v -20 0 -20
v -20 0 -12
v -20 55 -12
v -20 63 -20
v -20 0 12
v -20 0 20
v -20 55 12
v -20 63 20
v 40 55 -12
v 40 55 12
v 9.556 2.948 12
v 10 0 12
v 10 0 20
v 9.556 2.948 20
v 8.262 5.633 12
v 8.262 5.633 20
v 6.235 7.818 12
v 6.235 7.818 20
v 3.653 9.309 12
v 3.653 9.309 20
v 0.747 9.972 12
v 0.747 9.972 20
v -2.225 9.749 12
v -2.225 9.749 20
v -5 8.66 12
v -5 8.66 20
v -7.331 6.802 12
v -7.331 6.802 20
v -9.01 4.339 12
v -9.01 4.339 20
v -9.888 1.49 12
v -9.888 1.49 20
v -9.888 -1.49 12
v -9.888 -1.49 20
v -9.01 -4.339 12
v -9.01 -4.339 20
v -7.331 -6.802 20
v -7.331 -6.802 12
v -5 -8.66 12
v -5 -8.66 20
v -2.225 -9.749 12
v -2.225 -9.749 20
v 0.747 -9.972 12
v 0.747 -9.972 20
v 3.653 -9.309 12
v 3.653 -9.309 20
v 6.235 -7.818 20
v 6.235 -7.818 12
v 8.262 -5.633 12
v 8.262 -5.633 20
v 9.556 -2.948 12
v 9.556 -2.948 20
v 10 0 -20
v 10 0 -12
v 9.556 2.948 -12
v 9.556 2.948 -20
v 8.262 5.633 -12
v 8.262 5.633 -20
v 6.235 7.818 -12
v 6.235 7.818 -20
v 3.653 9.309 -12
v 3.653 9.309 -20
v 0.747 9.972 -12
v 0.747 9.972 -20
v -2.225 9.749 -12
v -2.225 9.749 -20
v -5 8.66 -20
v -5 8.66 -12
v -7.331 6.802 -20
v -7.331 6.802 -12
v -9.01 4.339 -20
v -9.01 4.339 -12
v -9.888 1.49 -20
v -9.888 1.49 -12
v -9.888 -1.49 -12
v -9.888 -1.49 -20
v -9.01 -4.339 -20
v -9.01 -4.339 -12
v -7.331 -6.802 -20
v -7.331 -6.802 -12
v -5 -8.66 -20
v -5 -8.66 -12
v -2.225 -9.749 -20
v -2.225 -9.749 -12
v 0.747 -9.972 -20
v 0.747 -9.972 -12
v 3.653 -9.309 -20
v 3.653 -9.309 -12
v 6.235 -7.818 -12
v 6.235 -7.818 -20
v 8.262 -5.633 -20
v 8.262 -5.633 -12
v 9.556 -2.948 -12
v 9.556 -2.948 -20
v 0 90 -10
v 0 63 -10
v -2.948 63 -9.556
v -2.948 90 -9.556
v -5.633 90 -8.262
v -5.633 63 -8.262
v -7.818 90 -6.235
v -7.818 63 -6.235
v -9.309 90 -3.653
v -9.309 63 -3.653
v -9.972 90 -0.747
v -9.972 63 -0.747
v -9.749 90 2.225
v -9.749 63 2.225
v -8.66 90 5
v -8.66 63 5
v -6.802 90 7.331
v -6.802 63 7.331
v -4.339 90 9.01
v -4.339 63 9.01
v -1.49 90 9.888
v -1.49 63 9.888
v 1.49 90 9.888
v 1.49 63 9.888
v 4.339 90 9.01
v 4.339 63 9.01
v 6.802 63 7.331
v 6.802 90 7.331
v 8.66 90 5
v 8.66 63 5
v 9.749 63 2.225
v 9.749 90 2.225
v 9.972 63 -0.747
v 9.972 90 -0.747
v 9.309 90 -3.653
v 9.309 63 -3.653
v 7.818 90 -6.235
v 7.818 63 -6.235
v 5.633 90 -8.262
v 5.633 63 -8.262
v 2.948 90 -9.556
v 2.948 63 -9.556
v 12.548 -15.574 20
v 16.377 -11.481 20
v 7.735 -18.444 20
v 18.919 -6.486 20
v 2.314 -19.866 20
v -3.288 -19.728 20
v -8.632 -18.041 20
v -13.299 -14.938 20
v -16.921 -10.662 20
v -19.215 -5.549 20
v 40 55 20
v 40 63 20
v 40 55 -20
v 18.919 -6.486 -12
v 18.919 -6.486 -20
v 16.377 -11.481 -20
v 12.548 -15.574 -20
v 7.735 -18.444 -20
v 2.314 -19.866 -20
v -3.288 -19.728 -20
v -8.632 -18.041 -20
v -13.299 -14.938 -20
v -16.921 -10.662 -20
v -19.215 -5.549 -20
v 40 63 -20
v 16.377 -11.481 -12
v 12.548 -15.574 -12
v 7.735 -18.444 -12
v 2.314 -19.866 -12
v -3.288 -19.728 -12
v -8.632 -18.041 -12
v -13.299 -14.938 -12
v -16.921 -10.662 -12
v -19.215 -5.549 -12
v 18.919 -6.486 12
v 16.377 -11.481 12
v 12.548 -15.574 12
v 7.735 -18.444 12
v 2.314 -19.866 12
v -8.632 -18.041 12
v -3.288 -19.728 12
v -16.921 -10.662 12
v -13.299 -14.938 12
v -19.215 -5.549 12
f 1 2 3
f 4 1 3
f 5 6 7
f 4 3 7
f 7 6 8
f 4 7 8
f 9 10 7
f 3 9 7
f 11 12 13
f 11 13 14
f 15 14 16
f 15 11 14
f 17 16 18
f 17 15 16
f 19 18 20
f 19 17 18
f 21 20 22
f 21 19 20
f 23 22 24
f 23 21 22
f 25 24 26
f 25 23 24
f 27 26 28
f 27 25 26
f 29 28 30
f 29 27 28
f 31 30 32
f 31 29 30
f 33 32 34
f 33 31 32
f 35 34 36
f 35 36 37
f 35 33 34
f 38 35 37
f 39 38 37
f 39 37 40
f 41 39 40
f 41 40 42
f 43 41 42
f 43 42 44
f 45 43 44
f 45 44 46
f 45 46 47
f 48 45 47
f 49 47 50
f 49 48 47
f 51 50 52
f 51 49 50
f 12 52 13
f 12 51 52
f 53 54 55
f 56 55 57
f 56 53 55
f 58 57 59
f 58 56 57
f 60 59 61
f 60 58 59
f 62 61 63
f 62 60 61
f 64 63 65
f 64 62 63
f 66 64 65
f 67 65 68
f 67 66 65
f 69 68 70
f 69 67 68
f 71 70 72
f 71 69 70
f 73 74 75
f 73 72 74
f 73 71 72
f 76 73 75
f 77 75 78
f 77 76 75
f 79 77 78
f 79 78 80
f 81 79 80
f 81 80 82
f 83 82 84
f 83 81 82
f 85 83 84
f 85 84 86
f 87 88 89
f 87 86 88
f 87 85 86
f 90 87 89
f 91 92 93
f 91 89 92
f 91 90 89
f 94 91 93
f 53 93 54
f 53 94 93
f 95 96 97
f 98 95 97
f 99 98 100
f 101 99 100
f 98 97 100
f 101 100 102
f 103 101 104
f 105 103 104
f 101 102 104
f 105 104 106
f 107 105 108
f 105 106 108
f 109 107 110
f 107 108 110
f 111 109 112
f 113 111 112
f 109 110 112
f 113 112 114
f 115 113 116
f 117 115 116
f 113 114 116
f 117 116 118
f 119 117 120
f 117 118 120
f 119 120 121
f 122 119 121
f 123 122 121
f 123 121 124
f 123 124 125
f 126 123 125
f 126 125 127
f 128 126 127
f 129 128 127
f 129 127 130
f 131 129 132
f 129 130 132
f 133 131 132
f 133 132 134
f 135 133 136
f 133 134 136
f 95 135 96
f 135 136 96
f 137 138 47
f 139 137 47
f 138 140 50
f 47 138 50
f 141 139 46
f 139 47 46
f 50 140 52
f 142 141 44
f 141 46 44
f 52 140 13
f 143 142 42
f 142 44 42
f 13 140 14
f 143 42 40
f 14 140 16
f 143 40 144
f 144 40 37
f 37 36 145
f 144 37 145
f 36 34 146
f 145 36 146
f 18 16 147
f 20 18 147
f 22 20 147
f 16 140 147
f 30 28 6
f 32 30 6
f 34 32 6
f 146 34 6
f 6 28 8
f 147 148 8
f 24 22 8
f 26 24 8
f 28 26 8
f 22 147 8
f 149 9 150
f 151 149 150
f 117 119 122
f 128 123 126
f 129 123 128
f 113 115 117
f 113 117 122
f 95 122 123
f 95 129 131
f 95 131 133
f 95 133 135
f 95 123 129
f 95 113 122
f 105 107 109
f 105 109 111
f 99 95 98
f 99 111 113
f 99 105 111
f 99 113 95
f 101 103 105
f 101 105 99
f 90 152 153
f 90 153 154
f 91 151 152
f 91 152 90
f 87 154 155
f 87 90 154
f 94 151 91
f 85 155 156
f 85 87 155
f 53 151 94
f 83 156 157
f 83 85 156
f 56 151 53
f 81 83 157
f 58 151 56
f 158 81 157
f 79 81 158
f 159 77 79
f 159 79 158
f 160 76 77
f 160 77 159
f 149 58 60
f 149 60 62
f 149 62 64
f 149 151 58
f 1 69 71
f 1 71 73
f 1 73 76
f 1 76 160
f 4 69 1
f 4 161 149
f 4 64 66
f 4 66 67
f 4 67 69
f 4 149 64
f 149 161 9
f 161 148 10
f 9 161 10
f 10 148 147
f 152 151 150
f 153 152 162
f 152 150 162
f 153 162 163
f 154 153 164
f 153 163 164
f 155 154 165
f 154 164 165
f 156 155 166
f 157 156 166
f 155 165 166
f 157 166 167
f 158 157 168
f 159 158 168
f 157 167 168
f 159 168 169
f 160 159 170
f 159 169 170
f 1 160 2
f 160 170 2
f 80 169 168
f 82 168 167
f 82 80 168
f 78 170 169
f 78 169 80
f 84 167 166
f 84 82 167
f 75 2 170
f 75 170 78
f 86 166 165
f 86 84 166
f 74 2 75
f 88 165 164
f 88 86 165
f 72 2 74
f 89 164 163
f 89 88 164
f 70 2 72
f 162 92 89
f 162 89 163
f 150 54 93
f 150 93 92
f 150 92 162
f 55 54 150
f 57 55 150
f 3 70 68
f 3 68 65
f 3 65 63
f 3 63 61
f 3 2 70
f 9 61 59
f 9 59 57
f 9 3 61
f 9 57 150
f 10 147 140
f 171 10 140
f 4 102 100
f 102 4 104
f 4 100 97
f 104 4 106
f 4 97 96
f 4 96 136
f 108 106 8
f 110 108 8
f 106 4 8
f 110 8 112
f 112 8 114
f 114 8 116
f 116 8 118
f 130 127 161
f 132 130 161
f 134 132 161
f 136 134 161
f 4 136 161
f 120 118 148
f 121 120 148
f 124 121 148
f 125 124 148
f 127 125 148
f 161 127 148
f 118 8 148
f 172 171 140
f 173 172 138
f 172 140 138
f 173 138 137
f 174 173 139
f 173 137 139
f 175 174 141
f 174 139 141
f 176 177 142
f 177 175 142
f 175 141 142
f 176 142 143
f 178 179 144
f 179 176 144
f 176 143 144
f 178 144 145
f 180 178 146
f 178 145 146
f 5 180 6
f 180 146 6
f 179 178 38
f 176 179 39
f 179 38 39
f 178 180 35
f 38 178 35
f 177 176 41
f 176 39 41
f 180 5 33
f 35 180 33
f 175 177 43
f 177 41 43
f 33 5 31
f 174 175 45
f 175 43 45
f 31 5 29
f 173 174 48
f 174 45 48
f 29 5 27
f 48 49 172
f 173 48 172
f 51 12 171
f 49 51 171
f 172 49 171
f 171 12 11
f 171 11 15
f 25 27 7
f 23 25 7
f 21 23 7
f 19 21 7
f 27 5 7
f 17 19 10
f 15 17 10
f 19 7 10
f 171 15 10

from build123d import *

# Parameters (mm, degrees)
SKETCH_1_R          = 10
EXTRUDE_1_DEPTH     = 20
CUT_EXTRUDE_1_DEPTH = 12
SKETCH_3_R          = 10
EXTRUDE_2_DEPTH     = 27


with BuildPart() as part:
    # 草图1 → 凸台-拉伸1 (new, symmetric)
    with BuildSketch(Plane.XY):
        with BuildLine():
            Line((40, 55), (18.91891904, -6.48648649))
            ThreePointArc((18.91891904, -6.48648649), (-3.287979748, -19.727878593), (-20.000000115, 0))
            Line((-20.000000115, 0), (-20.000000115, 55))
            Line((-20.000000115, 55), (-20.000000115, 63))
            Line((-20.000000115, 63), (40, 63))
            Line((40, 63), (40, 55))
        make_face()
        Circle(SKETCH_1_R, mode=Mode.SUBTRACT)
    extrude(amount=EXTRUDE_1_DEPTH, both=True)

    # 草图2 → 切除-拉伸1 (cut, symmetric)
    with BuildSketch(Plane.XY):
        with BuildLine():
            Line((18.91891904, -6.48648649), (40, 55))
            Line((40, 55), (-20.000000115, 55))
            Line((-20.000000115, 55), (-20.000000115, 0))
            ThreePointArc((-20.000000115, 0), (-3.287979748, -19.727878593), (18.91891904, -6.48648649))
        make_face()
    extrude(amount=CUT_EXTRUDE_1_DEPTH, both=True, mode=Mode.SUBTRACT)

    # 草图3 → 凸台-拉伸2 (add)
    with BuildSketch(Plane(origin=(0, 63, 0), x_dir=(1, 0, 0), z_dir=(0, 1, 0))):
        with Locations(Location((0, 0, 0), (0, 0, 90))):
            Circle(SKETCH_3_R)
    extrude(amount=EXTRUDE_2_DEPTH)


solid = part.part
